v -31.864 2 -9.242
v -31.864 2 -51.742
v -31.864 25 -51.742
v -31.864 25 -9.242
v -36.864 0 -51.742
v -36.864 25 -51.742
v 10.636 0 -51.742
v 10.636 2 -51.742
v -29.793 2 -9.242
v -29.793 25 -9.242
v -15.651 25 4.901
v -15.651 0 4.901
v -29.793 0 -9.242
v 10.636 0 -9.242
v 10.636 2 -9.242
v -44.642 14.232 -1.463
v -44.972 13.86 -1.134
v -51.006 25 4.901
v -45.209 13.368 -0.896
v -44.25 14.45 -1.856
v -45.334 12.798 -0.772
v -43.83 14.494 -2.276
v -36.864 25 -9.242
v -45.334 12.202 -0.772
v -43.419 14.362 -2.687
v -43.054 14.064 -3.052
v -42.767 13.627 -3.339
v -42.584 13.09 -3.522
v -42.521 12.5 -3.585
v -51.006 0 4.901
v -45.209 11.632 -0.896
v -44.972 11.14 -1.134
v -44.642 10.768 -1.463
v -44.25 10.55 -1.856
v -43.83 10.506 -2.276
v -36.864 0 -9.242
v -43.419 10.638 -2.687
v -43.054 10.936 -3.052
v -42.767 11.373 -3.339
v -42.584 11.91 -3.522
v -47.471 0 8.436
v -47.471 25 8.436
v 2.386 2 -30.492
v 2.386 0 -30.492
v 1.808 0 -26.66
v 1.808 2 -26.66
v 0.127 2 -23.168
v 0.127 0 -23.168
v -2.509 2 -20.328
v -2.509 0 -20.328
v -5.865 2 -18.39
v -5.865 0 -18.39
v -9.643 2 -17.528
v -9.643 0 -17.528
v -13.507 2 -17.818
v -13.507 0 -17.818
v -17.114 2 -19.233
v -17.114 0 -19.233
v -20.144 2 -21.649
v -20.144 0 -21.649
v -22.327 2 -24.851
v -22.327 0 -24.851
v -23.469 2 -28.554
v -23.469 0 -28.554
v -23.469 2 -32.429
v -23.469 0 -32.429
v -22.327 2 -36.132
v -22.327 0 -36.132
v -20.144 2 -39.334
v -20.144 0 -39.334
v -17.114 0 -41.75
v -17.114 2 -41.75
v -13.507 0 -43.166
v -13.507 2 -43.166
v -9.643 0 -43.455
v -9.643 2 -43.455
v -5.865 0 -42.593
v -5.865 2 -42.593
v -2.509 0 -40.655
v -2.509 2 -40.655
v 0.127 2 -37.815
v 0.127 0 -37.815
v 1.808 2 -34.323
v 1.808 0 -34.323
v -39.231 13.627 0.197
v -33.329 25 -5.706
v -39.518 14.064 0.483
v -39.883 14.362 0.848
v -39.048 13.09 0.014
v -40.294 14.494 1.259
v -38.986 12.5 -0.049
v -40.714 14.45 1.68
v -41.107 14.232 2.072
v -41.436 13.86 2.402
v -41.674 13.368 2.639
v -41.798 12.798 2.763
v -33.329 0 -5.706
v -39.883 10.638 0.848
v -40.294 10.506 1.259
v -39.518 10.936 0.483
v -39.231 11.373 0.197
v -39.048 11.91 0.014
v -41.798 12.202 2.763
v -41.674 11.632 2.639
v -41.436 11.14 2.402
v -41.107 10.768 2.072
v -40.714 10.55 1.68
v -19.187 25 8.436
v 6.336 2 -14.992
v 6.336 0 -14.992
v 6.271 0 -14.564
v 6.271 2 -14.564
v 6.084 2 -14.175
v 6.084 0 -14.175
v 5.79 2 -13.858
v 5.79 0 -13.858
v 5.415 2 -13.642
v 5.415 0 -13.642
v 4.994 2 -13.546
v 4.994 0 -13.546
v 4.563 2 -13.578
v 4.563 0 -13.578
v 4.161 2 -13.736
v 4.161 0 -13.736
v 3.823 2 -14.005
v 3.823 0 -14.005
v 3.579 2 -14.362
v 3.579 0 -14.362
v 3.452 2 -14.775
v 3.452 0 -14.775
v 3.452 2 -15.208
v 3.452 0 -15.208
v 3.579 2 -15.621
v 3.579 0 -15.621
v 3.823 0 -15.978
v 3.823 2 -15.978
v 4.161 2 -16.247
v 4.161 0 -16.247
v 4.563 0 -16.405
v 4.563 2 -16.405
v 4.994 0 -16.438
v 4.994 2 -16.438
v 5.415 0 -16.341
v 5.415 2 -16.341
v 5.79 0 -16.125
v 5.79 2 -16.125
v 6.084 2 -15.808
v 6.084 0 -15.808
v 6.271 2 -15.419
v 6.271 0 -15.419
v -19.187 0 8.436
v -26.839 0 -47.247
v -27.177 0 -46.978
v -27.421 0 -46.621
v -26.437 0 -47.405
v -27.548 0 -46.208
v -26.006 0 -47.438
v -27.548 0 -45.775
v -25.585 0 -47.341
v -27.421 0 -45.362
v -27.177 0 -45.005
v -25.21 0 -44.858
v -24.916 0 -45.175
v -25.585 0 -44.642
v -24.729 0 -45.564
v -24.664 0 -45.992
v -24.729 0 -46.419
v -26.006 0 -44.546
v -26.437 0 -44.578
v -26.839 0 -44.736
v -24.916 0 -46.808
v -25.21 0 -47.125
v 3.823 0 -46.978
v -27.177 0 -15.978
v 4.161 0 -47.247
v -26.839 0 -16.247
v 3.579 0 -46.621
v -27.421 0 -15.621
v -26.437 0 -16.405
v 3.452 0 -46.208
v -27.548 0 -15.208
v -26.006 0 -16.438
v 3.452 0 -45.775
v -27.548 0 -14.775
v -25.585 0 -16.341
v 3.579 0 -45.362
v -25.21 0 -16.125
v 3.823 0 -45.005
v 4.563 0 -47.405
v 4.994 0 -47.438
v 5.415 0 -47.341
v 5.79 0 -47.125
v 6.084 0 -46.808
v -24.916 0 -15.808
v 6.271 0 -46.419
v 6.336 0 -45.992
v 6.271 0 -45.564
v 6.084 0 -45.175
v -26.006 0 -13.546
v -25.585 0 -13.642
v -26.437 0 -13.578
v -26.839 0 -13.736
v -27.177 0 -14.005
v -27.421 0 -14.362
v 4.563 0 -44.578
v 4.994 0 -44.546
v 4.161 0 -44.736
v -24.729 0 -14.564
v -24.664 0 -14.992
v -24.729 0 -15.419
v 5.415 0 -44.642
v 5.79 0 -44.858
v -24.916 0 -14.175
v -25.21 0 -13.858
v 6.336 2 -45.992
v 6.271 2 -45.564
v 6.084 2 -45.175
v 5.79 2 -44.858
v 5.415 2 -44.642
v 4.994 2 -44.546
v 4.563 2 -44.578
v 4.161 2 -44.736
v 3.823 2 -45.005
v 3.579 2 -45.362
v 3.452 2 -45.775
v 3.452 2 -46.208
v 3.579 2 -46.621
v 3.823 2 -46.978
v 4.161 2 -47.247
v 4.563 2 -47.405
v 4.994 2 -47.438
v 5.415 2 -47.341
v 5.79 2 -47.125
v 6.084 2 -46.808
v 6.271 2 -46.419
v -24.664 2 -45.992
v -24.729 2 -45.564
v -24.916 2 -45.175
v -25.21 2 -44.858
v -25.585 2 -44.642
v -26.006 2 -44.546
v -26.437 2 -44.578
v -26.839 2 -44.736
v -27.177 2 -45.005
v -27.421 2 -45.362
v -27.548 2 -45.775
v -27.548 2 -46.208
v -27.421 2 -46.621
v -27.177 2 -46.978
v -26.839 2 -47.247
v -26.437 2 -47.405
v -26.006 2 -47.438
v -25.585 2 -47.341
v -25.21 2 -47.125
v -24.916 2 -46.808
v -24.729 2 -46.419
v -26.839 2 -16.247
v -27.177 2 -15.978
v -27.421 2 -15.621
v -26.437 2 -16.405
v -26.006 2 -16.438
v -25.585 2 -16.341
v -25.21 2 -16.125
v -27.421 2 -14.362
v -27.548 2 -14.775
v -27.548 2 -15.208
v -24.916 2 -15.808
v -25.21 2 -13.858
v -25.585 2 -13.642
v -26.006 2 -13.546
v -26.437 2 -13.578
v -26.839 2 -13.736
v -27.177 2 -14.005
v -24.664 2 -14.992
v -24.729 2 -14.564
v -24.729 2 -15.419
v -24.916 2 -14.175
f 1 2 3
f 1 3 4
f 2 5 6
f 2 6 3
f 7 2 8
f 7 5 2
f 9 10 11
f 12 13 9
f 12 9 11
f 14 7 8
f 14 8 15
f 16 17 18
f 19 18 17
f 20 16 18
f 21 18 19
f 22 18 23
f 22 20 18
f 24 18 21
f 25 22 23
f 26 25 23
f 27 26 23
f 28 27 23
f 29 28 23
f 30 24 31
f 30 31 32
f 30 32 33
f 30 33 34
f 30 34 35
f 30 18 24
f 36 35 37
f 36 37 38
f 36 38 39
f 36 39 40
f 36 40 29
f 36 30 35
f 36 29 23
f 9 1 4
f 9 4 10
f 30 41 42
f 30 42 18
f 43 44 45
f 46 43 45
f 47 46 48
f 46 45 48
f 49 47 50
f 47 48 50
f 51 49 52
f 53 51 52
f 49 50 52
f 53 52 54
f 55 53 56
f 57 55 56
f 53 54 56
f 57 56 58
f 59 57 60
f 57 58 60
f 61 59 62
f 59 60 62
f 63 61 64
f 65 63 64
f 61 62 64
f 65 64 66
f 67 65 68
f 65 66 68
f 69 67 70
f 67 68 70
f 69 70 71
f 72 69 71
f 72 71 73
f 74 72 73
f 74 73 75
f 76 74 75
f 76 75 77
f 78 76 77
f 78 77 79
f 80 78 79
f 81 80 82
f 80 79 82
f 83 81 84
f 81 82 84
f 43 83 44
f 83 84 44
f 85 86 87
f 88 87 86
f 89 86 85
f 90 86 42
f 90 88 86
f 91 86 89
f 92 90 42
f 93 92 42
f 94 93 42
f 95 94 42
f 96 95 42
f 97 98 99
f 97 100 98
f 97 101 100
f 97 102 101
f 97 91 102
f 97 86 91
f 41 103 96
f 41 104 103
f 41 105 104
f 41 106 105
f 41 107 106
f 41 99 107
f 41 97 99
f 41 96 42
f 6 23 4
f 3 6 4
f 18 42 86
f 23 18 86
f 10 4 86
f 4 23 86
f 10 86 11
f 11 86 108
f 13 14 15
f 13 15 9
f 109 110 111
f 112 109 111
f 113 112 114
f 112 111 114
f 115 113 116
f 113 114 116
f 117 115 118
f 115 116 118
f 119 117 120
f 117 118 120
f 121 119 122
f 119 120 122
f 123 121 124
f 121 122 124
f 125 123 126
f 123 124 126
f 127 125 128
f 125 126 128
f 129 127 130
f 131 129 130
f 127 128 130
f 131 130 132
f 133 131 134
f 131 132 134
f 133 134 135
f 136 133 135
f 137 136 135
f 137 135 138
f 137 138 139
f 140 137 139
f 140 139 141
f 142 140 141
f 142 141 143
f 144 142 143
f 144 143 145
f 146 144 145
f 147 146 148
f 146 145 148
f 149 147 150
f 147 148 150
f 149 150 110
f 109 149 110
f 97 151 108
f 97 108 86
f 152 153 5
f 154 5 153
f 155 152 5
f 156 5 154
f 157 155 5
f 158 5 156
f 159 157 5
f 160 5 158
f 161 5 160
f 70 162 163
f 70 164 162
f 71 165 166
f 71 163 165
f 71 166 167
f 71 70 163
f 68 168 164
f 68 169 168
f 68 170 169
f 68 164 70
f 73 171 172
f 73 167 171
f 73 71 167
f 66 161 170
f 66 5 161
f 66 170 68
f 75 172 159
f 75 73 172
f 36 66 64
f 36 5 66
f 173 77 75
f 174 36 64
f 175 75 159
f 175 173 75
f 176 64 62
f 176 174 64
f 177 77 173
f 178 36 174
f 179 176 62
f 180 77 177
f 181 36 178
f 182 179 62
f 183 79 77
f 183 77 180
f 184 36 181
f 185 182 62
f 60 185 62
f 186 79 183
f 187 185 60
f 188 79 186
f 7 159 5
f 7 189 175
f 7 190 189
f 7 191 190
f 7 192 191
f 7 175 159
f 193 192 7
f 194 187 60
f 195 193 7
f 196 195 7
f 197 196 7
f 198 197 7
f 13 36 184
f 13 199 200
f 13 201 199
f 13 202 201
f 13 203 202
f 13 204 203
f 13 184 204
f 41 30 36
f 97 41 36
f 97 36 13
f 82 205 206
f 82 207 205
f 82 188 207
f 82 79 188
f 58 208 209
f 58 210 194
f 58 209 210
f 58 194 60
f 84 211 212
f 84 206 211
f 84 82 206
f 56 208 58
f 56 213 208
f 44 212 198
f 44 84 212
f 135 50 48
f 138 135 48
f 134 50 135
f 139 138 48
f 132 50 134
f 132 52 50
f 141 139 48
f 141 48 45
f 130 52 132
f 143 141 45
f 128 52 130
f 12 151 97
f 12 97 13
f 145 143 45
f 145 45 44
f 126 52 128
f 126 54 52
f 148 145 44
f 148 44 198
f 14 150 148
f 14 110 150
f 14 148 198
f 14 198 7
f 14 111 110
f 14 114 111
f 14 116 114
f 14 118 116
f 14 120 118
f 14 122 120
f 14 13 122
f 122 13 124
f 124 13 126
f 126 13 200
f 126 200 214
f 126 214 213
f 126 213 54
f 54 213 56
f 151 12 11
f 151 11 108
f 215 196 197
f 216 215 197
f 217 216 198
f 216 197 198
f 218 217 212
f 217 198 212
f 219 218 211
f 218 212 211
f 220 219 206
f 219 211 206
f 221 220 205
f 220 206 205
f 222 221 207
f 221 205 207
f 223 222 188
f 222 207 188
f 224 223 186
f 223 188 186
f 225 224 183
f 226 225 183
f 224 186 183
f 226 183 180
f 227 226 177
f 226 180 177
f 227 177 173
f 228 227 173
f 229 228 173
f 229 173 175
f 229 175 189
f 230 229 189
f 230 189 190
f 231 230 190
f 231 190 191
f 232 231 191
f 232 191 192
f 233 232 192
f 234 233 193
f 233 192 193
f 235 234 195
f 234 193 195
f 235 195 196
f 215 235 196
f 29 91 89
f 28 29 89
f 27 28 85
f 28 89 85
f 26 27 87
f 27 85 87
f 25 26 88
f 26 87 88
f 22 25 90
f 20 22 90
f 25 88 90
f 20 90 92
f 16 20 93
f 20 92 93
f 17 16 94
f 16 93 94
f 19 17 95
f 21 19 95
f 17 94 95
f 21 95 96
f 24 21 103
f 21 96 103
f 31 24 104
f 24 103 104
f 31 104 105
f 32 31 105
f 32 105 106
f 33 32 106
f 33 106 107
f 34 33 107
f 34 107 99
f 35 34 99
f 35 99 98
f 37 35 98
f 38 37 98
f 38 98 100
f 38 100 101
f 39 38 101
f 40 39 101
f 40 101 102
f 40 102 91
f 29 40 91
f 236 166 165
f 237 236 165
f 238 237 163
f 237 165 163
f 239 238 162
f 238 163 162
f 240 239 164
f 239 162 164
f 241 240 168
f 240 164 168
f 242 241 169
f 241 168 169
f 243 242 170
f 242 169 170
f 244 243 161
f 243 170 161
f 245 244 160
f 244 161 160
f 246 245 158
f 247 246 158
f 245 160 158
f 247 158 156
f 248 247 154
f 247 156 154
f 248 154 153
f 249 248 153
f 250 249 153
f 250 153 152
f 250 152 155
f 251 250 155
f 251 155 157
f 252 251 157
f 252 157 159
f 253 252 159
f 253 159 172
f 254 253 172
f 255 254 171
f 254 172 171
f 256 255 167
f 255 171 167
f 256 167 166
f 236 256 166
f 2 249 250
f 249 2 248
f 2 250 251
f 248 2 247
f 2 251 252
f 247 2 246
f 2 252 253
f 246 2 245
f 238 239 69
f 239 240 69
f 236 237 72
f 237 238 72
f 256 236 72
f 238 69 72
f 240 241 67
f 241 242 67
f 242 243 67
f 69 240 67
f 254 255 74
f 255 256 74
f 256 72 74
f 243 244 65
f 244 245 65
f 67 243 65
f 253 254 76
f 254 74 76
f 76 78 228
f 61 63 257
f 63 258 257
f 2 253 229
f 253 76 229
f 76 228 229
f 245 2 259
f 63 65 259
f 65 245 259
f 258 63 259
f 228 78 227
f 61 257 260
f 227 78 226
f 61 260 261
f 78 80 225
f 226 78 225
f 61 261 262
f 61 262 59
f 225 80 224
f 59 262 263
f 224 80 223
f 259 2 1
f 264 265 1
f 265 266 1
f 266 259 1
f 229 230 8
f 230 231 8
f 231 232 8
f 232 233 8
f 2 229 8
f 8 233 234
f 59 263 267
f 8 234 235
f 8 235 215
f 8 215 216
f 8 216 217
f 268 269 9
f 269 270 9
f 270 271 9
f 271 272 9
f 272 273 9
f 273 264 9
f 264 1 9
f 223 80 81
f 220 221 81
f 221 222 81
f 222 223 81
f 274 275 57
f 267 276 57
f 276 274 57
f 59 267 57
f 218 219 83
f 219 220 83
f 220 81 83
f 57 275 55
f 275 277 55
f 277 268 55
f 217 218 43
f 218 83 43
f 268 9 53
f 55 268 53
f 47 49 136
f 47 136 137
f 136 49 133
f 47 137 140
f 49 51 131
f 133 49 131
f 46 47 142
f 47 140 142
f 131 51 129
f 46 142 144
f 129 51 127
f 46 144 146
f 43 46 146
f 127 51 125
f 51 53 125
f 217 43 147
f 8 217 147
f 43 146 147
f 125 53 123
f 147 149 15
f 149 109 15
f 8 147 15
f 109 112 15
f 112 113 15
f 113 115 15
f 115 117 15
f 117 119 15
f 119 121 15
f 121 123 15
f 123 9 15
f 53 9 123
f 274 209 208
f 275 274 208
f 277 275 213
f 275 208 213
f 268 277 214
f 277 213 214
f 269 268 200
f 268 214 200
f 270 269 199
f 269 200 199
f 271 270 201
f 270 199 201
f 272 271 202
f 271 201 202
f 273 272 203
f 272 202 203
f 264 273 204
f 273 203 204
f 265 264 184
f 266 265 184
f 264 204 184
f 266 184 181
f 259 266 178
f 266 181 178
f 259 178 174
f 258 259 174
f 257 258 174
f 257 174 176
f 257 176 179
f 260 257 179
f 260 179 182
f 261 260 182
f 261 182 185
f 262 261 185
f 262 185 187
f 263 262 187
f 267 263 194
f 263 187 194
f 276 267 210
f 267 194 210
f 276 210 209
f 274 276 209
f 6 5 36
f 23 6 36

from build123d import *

# Parameters (mm, degrees)
F0_W     = 5
F0_H     = 42.5
F1_DEPTH = 25
F0_R     = 1.45
F0_R_2   = 13
F2_DEPTH = 2
F3_R     = 2
F4_DEPTH = 25


# Not quite as in the source:
# - a feature names something its author has since deleted; it is built from what else it names


with BuildPart() as f1:
    # F0 (on Front) → F1 (new body)
    with BuildSketch(Plane.XZ):
        Polygon((-51.006380532, 4.9005637974), (-36.8642449083, -9.2415718264), (-31.8642449083, -9.2415718264), (-29.7931770964, -9.2415718264), (-33.3287110023, -5.7060379204), (-47.4708466261, 8.4360977033), align=None)
        with Locations((-34.3642449083, -30.4915718264)):
            Rectangle(F0_W, F0_H)
        Polygon((-33.3287110023, -5.7060379204), (-29.7931770964, -9.2415718264), (-15.6510414727, 4.9005637974), (-19.1865753786, 8.4360977033), align=None)
    extrude(amount=-F1_DEPTH)

    # F0 (on Front) → F2 (join)
    with BuildSketch(Plane.XZ):
        Polygon((-29.7931770964, -9.2415718264), (-31.8642449083, -9.2415718264), (-31.8642449083, -51.7415718264), (10.6357550917, -51.7415718264), (10.6357550917, -9.2415718264), align=None)
        with Locations((-26.1142449083, -45.9915718264)):
            Circle(F0_R, mode=Mode.SUBTRACT)
        with Locations((4.8857550917, -45.9915718264)):
            Circle(F0_R, mode=Mode.SUBTRACT)
        with Locations((-10.6142449083, -30.4915718264)):
            Circle(F0_R_2, mode=Mode.SUBTRACT)
        with Locations((-26.1142449083, -14.9915718264)):
            Circle(F0_R, mode=Mode.SUBTRACT)
        with Locations((4.8857550917, -14.9915718264)):
            Circle(F0_R, mode=Mode.SUBTRACT)
    extrude(amount=-F2_DEPTH)

    # F3 (on face) → F4 (cut)
    with BuildSketch(Plane(origin=(-19.5173744614, 0, -19.5173744614), x_dir=(0.7071067812, 0, -0.7071067812), z_dir=(0.7071067812, 0, 0.7071067812))):
        with Locations((-29.5321794507, 12.5)):
            Circle(F3_R)
    extrude(amount=-F4_DEPTH, mode=Mode.SUBTRACT)


solid = f1.part
